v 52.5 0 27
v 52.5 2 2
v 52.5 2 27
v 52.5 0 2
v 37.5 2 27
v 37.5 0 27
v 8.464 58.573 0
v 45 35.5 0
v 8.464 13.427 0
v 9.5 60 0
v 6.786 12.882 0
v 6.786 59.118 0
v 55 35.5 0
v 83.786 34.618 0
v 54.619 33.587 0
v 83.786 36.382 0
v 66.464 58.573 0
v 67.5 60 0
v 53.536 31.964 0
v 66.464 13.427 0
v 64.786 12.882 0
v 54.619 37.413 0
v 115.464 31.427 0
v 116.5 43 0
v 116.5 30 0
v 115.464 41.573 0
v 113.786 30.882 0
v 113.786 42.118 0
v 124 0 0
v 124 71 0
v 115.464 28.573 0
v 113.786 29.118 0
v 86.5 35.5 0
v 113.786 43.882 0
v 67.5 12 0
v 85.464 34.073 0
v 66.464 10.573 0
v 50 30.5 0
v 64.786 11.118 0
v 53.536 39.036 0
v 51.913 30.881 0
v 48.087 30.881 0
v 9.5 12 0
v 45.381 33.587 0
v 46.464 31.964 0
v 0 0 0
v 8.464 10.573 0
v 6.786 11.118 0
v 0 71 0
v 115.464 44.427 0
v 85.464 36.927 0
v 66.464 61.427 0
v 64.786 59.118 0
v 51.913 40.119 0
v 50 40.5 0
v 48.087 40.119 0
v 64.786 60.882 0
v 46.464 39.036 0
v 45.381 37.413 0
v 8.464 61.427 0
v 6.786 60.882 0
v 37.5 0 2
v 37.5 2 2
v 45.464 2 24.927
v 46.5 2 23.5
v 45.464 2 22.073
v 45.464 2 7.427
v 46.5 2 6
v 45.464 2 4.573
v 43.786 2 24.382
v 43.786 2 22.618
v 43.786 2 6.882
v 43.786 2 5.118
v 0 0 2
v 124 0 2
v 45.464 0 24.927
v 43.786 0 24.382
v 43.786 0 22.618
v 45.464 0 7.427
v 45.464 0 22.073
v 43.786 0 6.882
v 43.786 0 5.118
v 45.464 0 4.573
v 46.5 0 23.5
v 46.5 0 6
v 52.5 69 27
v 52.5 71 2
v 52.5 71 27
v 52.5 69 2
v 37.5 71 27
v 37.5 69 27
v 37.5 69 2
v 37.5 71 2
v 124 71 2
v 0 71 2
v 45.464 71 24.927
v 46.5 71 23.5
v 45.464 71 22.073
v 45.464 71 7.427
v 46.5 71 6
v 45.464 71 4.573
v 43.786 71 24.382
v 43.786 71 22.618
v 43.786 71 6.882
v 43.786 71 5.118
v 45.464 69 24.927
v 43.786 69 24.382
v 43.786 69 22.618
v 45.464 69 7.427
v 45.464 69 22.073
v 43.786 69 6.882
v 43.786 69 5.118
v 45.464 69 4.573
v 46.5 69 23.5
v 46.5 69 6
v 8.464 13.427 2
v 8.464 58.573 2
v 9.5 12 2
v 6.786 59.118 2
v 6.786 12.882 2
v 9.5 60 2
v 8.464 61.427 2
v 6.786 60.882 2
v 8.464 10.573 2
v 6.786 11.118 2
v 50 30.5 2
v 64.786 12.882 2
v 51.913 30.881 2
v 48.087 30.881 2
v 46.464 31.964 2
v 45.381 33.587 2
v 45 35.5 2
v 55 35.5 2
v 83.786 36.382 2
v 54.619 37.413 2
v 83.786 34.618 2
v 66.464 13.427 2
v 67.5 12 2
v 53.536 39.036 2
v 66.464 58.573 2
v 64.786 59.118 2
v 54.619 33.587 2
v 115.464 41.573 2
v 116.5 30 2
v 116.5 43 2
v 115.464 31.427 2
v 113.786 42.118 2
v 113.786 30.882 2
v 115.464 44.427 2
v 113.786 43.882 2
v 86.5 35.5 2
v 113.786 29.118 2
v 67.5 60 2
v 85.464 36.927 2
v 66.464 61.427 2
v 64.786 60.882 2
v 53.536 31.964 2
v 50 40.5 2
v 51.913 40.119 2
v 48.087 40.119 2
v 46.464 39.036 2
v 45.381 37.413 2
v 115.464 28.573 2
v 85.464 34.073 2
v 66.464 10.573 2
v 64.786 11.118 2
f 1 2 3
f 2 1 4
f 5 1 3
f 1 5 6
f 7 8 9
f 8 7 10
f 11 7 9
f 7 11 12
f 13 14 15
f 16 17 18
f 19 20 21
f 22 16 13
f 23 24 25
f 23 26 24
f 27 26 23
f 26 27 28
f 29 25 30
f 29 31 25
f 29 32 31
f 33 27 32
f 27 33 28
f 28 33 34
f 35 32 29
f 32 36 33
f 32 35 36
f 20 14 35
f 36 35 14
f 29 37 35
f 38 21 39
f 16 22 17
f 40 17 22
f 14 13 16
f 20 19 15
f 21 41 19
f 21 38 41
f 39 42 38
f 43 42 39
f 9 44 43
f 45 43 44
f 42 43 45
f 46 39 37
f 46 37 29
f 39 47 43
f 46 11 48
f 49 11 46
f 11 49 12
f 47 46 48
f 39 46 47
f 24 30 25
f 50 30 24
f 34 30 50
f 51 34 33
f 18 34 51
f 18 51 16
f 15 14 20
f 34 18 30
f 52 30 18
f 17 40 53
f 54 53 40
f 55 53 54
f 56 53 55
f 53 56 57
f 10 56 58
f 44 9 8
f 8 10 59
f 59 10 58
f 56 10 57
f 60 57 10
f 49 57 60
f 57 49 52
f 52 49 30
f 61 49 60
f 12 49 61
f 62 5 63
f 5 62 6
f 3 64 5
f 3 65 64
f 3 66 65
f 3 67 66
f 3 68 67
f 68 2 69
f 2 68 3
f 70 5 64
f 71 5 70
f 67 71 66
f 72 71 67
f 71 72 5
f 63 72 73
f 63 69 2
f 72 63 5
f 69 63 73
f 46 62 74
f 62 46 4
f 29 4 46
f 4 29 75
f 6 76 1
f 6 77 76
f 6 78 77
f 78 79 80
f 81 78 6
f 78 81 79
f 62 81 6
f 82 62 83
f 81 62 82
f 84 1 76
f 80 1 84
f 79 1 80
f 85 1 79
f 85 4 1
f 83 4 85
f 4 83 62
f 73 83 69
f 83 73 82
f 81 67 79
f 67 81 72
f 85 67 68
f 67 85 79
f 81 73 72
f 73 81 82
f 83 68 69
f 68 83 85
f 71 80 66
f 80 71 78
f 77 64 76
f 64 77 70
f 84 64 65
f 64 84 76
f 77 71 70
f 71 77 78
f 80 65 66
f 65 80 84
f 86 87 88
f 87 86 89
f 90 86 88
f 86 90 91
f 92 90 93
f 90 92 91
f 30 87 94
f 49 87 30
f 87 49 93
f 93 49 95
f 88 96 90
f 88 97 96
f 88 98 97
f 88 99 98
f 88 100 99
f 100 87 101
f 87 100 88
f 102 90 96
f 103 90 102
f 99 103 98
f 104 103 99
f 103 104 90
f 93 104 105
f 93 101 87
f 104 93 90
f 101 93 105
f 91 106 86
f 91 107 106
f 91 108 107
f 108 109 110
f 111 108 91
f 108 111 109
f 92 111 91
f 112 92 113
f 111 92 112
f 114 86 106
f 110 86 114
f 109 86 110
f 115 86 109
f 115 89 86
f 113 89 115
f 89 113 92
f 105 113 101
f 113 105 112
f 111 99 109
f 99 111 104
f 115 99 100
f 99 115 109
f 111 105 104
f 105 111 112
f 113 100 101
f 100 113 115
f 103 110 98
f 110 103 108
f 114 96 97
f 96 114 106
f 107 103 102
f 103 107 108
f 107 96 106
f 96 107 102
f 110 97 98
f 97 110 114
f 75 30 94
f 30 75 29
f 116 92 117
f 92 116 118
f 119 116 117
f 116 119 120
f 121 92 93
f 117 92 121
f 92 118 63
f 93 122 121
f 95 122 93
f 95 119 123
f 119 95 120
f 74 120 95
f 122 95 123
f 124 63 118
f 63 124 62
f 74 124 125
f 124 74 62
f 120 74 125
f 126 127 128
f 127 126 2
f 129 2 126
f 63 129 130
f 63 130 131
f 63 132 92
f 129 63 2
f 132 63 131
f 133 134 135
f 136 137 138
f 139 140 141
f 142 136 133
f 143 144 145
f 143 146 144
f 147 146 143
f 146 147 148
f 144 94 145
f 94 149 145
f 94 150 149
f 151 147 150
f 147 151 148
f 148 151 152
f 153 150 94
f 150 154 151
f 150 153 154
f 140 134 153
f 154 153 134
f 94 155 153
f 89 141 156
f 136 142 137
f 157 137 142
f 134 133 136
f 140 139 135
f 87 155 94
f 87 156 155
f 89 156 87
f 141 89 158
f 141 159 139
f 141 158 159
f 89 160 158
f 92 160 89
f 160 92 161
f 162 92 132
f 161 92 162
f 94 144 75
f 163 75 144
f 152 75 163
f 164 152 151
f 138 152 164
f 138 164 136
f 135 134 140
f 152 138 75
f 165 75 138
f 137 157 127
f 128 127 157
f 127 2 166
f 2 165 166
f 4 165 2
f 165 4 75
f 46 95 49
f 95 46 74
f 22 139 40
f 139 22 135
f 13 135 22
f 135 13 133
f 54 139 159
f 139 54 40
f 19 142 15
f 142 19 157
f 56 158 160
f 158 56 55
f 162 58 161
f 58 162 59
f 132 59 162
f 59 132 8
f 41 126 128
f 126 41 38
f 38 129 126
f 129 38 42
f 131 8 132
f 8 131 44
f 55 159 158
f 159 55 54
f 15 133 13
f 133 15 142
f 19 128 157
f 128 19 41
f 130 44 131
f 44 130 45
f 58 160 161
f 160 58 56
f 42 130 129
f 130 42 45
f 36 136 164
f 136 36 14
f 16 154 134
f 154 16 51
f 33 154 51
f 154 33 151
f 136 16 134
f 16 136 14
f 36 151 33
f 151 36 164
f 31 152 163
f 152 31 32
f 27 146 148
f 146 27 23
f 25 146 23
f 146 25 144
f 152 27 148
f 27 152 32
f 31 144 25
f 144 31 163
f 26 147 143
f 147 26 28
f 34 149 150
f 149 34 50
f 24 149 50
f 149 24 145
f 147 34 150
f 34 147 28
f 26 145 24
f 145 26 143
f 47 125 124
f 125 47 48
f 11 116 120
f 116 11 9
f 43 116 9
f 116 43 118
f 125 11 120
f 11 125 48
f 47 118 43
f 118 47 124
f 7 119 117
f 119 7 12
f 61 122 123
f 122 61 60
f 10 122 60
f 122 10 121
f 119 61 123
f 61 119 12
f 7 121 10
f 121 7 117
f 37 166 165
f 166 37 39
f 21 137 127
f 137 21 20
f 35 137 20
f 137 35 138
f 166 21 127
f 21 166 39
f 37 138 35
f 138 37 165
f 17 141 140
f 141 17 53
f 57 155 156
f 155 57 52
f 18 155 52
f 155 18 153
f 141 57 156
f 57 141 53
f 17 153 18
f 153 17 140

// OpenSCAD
thick_length=2; //length thickness
thick_width=2; //width thickness
thick_bottom=2; //depth thickness
orig_length=120+2*thick_width; //original box length
orig_width=67; //original box width (100)
orig_depth=25+thick_bottom; //original box depth
wire_hole_radius=5; //RADIUS of the wire hole, NOT diameter
x_center_wire_hole=139; //x-axis location of wire hole
y_center_hole=(orig_width+2*thick_length)/2;
dist_from_front_bw_sensor=75; //amt of distance from the front of vehicle
x_wheel_hole_dist_from_back=115; //amt of distance from the back of the vehicle for the two metal wheel holes (x)
length_btwn_wheel_holes=38;
y_wheel_hole_dist_from_side_r=30; //amt of distance from the side of the vehicle for right metal wheel hole
dia_wheel_hole=3; //radius of each of the wheel holes
y_wheel_hole_dist_from_side_l=orig_width-y_wheel_hole_dist_from_side_r+6; //amt of distance from the side of the vehicle for left metal wheel hole
bottom_motor_hole=thick_bottom+dia_wheel_hole+1;
width_btwn_radiuses_motor_holes=17.5;
top_motor_hole=bottom_motor_hole+width_btwn_radiuses_motor_holes;
x_distance_back_motor_hole=45;
motor_wheel_radius=6.5;
motor_wheel_from_its_holes=x_distance_back_motor_hole-20;
motor_wheel_to_bottom=thick_bottom+11;
motor_wire_space_length=34;
motor_wire_space_height=25;
motor_hole_to_motor_wire_space=4.5;
y_holes_dist = 48;
x_holes_dist = 58;
x_hole_one = (orig_length-x_holes_dist-50)/2;
y_hole_one = (orig_width-y_holes_dist+5)/2;

//Left Side of Vehicle
difference(){
    translate([37.5,0,0]){
        cube([15,thick_length,orig_depth]);
    }
    translate([x_distance_back_motor_hole,thick_length,bottom_motor_hole]){
      rotate([90,0,0]){
          cylinder(h=bottom_motor_hole,d=dia_wheel_hole);
      }
    }
    translate([x_distance_back_motor_hole,thick_length,top_motor_hole]){
      rotate([90,0,0]){
          cylinder(h=bottom_motor_hole,d=dia_wheel_hole);
      }
    }
}
translate([0,thick_length + orig_width,0]){
    difference(){
        translate([37.5,0,0]){
            cube([15,thick_length,orig_depth]);
        }
        translate([x_distance_back_motor_hole,thick_length,bottom_motor_hole]){
          rotate([90,0,0]){
              cylinder(h=bottom_motor_hole,d=dia_wheel_hole);
          }
        }
        translate([x_distance_back_motor_hole,thick_length,top_motor_hole]){
          rotate([90,0,0]){
              cylinder(h=bottom_motor_hole,d=dia_wheel_hole);
          }
        }
    }
}

difference(){
    //Bottom of Vehicle
    cube([orig_length,orig_width+2*thick_length,thick_bottom]);
    translate([50,y_center_hole,0]){
      cylinder(h=thick_bottom,r=wire_hole_radius);
    }
    translate([85,y_center_hole,0]){
      cylinder(h=thick_bottom,d=dia_wheel_hole); 
    }
    translate([x_wheel_hole_dist_from_back,y_wheel_hole_dist_from_side_r,0]){
      cylinder(h=thick_bottom,d=dia_wheel_hole);
    }
    translate([x_wheel_hole_dist_from_back,y_wheel_hole_dist_from_side_l,0]){
      cylinder(h=thick_bottom,d=dia_wheel_hole);
    }
    translate([x_hole_one,y_hole_one,0]){
        cylinder(h=thick_bottom,d=dia_wheel_hole);
    }
    translate([x_hole_one,y_holes_dist+y_hole_one,0]){
        cylinder(h=thick_bottom,d=dia_wheel_hole);
    }
    translate([x_holes_dist+x_hole_one,y_hole_one,0]){
        cylinder(h=thick_bottom,d=dia_wheel_hole);
    }
    translate([x_holes_dist+x_hole_one,y_holes_dist+y_hole_one,0]){
        cylinder(h=thick_bottom,d=dia_wheel_hole);
    }
    
}
